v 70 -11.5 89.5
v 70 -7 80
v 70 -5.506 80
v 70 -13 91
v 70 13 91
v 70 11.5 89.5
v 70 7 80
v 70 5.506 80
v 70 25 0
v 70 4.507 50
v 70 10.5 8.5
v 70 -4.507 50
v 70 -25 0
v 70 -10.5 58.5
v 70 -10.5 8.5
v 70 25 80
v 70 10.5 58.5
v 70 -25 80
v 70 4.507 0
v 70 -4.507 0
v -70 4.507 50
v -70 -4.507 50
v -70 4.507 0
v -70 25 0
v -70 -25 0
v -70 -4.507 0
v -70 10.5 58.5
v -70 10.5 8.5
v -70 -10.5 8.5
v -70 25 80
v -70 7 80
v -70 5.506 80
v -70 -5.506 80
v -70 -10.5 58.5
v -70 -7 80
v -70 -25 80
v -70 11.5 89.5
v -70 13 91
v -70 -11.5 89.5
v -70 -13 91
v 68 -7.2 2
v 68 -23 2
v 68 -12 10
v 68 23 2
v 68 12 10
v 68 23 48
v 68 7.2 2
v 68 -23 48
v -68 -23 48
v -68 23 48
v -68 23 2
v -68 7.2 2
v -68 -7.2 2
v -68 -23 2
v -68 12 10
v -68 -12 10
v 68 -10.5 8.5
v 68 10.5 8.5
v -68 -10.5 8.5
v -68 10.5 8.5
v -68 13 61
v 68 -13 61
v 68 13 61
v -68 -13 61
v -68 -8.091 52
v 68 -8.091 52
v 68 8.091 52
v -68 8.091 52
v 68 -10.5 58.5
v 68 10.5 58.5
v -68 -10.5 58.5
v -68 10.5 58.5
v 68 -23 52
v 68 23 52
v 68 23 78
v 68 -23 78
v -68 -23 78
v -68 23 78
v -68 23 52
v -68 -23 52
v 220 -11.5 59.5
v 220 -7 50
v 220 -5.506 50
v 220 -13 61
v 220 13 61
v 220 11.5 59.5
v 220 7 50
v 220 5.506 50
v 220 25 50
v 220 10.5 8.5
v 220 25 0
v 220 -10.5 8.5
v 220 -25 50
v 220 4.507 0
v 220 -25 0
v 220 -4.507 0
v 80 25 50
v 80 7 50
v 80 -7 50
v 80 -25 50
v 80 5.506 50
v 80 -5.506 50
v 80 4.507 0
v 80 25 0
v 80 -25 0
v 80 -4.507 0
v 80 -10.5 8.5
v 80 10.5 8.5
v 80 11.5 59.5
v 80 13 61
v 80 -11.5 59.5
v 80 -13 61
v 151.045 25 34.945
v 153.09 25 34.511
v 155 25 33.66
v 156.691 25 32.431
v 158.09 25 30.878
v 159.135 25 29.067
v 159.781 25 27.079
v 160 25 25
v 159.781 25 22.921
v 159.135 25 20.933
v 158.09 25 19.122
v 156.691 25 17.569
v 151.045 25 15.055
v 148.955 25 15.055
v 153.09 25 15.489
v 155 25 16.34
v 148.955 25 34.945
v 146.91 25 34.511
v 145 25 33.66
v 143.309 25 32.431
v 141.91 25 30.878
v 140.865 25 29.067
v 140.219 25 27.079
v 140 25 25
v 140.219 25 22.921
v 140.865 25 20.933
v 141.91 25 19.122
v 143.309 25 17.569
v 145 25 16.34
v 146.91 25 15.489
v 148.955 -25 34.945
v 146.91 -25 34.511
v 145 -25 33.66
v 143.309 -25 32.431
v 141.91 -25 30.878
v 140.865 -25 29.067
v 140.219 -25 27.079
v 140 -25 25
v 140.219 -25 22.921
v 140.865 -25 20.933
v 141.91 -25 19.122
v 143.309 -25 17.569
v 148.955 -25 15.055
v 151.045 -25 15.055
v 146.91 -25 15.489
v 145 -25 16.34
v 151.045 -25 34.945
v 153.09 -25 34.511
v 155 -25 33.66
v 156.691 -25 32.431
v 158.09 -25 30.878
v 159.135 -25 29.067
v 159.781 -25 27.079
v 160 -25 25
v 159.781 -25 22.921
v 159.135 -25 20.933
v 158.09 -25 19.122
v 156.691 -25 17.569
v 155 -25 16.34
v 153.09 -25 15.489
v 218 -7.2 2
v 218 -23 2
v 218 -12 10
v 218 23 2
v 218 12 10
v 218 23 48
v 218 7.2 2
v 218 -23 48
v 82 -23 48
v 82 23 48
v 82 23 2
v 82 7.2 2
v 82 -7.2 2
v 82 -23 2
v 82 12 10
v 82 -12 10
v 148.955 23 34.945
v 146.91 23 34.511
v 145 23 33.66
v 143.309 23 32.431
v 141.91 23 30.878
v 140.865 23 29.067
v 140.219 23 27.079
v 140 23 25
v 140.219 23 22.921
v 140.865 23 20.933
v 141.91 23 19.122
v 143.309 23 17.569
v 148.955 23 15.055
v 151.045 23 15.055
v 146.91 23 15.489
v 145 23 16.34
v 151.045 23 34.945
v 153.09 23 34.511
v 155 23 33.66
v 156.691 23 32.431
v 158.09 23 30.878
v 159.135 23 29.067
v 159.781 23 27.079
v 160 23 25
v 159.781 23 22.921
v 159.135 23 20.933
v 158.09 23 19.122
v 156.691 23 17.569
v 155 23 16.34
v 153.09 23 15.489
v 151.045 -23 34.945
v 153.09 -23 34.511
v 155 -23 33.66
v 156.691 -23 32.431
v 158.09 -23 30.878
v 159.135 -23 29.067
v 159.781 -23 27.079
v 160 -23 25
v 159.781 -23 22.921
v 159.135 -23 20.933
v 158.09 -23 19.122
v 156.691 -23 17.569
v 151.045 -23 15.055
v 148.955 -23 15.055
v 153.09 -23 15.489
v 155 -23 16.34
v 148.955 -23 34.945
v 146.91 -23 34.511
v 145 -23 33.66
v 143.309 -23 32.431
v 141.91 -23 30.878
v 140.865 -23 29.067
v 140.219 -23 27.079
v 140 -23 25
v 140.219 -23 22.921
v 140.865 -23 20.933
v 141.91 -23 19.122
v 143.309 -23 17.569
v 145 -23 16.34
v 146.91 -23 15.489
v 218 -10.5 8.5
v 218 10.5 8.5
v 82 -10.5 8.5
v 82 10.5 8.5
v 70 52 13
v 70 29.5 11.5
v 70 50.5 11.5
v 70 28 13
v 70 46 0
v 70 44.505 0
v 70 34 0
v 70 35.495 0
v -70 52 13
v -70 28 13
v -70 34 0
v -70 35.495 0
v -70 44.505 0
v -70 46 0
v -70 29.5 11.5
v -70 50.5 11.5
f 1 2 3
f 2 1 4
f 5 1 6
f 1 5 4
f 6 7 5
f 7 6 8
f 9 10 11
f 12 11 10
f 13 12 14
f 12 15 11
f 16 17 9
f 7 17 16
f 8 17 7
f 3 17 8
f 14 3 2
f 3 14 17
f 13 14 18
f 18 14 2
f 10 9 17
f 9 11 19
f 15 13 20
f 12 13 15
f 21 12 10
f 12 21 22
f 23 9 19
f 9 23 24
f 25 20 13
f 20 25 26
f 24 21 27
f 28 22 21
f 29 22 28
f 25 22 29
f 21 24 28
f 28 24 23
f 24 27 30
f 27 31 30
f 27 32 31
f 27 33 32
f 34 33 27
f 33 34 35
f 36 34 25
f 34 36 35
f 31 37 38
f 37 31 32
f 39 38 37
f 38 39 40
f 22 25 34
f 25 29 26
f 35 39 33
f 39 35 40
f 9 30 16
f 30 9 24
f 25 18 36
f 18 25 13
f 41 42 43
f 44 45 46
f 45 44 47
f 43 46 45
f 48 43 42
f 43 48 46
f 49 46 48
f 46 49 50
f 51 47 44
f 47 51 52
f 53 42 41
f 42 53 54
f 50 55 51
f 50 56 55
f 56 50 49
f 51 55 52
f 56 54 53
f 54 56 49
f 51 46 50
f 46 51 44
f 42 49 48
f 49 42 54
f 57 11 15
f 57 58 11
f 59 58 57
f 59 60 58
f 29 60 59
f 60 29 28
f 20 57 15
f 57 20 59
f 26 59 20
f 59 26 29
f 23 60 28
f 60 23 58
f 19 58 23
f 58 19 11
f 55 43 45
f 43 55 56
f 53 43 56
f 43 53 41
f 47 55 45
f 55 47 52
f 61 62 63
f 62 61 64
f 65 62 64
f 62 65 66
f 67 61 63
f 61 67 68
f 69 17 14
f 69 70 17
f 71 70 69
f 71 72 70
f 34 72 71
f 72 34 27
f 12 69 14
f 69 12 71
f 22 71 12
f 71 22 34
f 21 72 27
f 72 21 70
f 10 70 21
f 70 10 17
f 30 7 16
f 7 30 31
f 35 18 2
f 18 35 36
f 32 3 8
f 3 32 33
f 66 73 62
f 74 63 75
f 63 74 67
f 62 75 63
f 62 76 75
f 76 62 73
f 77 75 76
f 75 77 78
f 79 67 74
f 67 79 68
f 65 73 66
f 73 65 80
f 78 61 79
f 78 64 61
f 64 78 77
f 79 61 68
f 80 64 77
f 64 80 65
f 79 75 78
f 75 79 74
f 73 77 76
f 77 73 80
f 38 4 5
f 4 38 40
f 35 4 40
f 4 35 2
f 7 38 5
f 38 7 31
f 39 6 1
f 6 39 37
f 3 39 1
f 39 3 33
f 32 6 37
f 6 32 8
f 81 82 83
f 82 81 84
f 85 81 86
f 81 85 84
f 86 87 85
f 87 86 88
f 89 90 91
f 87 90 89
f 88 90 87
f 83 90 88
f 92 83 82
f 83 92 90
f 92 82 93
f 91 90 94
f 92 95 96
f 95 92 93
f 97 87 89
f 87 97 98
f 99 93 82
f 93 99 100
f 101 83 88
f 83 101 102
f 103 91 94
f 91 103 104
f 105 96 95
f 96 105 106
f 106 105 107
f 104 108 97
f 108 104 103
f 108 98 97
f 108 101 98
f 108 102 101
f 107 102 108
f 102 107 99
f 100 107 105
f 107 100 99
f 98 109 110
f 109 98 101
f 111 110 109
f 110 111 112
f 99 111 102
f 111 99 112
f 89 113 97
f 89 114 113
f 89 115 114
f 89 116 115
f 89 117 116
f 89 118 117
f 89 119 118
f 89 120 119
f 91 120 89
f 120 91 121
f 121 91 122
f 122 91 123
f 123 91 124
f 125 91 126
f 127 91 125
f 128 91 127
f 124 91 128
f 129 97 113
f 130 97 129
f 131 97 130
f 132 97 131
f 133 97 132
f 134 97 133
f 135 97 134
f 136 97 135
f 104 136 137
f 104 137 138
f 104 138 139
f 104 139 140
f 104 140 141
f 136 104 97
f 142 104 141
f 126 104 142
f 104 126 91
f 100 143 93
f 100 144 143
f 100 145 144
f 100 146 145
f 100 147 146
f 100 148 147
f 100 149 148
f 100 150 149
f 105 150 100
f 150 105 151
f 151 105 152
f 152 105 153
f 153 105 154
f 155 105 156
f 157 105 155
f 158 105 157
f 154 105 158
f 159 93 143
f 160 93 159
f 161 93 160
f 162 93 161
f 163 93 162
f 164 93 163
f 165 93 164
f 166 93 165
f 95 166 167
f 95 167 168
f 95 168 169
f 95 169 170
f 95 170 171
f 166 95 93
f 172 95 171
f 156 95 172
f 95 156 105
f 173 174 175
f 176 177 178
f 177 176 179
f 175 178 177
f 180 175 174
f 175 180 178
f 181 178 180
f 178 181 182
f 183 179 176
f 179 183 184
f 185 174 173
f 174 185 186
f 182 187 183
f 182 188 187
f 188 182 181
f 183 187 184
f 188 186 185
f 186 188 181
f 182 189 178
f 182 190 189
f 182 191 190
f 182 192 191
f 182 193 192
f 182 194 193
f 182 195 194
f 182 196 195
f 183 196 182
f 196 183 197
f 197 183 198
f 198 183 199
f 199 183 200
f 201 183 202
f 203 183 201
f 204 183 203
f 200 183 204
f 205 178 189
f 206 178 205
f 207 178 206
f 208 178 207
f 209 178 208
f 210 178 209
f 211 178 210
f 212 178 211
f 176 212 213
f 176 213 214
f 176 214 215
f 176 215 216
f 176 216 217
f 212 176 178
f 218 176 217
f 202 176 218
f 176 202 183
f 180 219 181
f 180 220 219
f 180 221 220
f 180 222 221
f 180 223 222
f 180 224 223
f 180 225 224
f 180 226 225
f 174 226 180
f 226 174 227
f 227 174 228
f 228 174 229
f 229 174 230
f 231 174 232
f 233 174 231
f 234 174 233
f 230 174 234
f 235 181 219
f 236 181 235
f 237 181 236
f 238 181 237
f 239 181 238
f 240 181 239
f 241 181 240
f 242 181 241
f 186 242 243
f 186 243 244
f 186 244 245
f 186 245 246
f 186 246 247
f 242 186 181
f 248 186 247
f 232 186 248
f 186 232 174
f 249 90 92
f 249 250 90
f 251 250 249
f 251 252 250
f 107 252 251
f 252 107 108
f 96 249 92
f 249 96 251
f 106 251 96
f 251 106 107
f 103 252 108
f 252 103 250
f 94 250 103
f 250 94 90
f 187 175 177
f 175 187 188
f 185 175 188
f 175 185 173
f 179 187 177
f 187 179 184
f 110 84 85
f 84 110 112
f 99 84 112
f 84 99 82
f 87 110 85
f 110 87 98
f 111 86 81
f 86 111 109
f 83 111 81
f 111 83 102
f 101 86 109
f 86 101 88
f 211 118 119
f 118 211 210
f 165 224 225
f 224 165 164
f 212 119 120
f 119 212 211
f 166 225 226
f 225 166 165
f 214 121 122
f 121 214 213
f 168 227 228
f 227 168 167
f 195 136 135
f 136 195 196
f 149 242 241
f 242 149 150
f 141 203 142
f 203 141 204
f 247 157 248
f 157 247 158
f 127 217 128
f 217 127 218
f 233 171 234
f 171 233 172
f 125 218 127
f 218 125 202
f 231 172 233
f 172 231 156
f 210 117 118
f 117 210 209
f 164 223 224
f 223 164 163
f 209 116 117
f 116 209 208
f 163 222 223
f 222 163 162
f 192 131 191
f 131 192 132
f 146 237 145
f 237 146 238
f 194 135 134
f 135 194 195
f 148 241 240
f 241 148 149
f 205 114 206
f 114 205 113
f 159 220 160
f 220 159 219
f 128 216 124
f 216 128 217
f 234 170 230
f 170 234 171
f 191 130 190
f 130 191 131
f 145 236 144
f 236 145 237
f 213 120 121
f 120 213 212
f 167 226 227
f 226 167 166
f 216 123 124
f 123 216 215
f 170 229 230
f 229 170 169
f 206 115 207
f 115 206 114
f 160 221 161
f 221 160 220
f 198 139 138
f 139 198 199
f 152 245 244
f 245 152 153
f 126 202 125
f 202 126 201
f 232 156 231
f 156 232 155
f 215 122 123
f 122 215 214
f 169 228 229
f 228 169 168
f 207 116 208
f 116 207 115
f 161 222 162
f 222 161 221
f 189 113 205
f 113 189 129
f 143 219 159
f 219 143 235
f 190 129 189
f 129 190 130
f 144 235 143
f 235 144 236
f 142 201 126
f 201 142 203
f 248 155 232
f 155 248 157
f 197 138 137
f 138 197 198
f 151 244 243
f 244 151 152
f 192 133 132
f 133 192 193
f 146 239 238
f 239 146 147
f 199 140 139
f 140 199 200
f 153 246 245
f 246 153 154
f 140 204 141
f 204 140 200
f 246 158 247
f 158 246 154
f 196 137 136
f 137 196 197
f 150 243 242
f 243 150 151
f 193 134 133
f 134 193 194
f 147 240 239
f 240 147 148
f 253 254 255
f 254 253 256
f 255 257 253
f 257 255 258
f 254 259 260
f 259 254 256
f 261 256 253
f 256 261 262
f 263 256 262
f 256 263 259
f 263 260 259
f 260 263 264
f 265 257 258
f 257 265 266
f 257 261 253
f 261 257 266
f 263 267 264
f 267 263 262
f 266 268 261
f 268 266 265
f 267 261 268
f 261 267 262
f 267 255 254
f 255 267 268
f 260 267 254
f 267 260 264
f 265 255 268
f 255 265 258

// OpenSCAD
// Put Affero License here
// TODO FOR JAHNAVI:
// 1. Fix the narrowness in the wall thickness
// 2. Add a slot on top where the mail dovetail is.
// 3. Make all the dovetail consistently resizable (make sure it all fits)

// TODO:
// 1) Add Licence premable
// 1.5) Make boxes instead of solid cubes - Jahanavi (DONE)
// 2) Cut the female dovetial -- 
// 3) Add parameterizes margins (0.5 mm)
// 4) Make it two dovetails instead of 1
// 5) Add an empty "chamber" for the cables
// 6) Add a "bottom plate" that does not have a female dovetail
// 7) Add a "top plate" that does not have a male dovetail
// 8) Add a "generic face plate" as a union-izable module
// 9) Add threaded rod holes


// Initial size configuration

depth_mm = 50;
width_mm = 140;
RENDER = 1;
dovetial_margin_mm = 0.5;
knife_margin_mm = 0.01;
wall_mm = 2;

dt_height = 8; // Height is difference from flat top to base.
dt_width = 10;
dt_narrow_width = 4;


USE_RENDER_KNIFE = 0;

module dovetail(dt_h = dt_height,dt_w = dt_width, dt_n_w = dt_narrow_width) {
    y = dt_w;
    y_in = dt_n_w;
    z = dt_h;
    points = [[0,y_in],[z,y],[z,-y],[0,-y_in]];
    rotate([0,-90,0])
    linear_extrude(height = width_mm,center = true)
    polygon(points);
}


module female_dovetail_knife(dt_h = dt_height,dt_w = dt_width, dt_n_w = dt_narrow_width) {

    y = dt_w + dovetial_margin_mm;
    y_in = dt_n_w + dovetial_margin_mm;
    z = dt_h + dovetial_margin_mm;

    points = [
        [0-knife_margin_mm, y_in],
        [z, y],
        [z,-y],
        [0-knife_margin_mm,-y_in]
    ];

    rotate([0,-90,0])
        linear_extrude(height = width_mm + 2, center = true)
            polygon(points);
}

module dove_tail_shell(dt_h = dt_height,dt_w = dt_width, dt_n_w = dt_narrow_width) {
    y = dt_w + wall_mm;
    y_in = dt_n_w + wall_mm;
    z = dt_h + wall_mm;

    points = [
       [0, y_in],
       [z, y],
       [z,-y],
       [0,-y_in]
    ];
    
    rotate([0,-90,0])
    difference() {
        linear_extrude(height = width_mm, center = true)
        polygon(points);
        rotate([0,90,0])
        female_dovetail_knife(dt_h,dt_w,dt_n_w);
    }
}



module speaker_component() {
    difference() {
        generic_component(50);
        translate([0,0,25])
        rotate([90,0,0])
        cylinder(100,10,10,center=true);
    }
}


module top_end_plate() {
}

module bottom_end_plate() {
}

module blank_face_plate() {
}




module generic_component (height_mm) {

    difference() {
        // Main body
        translate([-width_mm/2,-depth_mm/2,0])
        cube([width_mm, depth_mm, height_mm]);
        
        translate([ -width_mm/2 + wall_mm,
                    -depth_mm/2 + wall_mm,
                    wall_mm
        ])
        cube([width_mm - 2*wall_mm,depth_mm - 2*wall_mm, height_mm - 2*wall_mm]);
        // Female dovetail socket
        female_dovetail_knife(dt_height,dt_width,dt_narrow_width);
    }
    
    dove_tail_shell(dt_height);

    // Male dovetail on top
    translate([0,0,height_mm])
        dove_tail_shell(dt_height+1,dt_width+1,dt_narrow_width+1);
}


// Example: Create a working system by composing components
module render() {
    if (RENDER) {       
        color("blue")
        generic_component(50);
        
        
        translate([0,0,50])
        color("green")
        generic_component(30);
        
        translate([150,0,0])
        color("red")
        speaker_component();
        
        color("green")
        translate([0,40,0])
        dove_tail_shell(dt_height+3);
    }
}

if (USE_RENDER_KNIFE) {
    difference() {
        render();
        translate([300/2,0,0])
        cube([300,300,300],center=true);
    }
} else {
    render();
}
